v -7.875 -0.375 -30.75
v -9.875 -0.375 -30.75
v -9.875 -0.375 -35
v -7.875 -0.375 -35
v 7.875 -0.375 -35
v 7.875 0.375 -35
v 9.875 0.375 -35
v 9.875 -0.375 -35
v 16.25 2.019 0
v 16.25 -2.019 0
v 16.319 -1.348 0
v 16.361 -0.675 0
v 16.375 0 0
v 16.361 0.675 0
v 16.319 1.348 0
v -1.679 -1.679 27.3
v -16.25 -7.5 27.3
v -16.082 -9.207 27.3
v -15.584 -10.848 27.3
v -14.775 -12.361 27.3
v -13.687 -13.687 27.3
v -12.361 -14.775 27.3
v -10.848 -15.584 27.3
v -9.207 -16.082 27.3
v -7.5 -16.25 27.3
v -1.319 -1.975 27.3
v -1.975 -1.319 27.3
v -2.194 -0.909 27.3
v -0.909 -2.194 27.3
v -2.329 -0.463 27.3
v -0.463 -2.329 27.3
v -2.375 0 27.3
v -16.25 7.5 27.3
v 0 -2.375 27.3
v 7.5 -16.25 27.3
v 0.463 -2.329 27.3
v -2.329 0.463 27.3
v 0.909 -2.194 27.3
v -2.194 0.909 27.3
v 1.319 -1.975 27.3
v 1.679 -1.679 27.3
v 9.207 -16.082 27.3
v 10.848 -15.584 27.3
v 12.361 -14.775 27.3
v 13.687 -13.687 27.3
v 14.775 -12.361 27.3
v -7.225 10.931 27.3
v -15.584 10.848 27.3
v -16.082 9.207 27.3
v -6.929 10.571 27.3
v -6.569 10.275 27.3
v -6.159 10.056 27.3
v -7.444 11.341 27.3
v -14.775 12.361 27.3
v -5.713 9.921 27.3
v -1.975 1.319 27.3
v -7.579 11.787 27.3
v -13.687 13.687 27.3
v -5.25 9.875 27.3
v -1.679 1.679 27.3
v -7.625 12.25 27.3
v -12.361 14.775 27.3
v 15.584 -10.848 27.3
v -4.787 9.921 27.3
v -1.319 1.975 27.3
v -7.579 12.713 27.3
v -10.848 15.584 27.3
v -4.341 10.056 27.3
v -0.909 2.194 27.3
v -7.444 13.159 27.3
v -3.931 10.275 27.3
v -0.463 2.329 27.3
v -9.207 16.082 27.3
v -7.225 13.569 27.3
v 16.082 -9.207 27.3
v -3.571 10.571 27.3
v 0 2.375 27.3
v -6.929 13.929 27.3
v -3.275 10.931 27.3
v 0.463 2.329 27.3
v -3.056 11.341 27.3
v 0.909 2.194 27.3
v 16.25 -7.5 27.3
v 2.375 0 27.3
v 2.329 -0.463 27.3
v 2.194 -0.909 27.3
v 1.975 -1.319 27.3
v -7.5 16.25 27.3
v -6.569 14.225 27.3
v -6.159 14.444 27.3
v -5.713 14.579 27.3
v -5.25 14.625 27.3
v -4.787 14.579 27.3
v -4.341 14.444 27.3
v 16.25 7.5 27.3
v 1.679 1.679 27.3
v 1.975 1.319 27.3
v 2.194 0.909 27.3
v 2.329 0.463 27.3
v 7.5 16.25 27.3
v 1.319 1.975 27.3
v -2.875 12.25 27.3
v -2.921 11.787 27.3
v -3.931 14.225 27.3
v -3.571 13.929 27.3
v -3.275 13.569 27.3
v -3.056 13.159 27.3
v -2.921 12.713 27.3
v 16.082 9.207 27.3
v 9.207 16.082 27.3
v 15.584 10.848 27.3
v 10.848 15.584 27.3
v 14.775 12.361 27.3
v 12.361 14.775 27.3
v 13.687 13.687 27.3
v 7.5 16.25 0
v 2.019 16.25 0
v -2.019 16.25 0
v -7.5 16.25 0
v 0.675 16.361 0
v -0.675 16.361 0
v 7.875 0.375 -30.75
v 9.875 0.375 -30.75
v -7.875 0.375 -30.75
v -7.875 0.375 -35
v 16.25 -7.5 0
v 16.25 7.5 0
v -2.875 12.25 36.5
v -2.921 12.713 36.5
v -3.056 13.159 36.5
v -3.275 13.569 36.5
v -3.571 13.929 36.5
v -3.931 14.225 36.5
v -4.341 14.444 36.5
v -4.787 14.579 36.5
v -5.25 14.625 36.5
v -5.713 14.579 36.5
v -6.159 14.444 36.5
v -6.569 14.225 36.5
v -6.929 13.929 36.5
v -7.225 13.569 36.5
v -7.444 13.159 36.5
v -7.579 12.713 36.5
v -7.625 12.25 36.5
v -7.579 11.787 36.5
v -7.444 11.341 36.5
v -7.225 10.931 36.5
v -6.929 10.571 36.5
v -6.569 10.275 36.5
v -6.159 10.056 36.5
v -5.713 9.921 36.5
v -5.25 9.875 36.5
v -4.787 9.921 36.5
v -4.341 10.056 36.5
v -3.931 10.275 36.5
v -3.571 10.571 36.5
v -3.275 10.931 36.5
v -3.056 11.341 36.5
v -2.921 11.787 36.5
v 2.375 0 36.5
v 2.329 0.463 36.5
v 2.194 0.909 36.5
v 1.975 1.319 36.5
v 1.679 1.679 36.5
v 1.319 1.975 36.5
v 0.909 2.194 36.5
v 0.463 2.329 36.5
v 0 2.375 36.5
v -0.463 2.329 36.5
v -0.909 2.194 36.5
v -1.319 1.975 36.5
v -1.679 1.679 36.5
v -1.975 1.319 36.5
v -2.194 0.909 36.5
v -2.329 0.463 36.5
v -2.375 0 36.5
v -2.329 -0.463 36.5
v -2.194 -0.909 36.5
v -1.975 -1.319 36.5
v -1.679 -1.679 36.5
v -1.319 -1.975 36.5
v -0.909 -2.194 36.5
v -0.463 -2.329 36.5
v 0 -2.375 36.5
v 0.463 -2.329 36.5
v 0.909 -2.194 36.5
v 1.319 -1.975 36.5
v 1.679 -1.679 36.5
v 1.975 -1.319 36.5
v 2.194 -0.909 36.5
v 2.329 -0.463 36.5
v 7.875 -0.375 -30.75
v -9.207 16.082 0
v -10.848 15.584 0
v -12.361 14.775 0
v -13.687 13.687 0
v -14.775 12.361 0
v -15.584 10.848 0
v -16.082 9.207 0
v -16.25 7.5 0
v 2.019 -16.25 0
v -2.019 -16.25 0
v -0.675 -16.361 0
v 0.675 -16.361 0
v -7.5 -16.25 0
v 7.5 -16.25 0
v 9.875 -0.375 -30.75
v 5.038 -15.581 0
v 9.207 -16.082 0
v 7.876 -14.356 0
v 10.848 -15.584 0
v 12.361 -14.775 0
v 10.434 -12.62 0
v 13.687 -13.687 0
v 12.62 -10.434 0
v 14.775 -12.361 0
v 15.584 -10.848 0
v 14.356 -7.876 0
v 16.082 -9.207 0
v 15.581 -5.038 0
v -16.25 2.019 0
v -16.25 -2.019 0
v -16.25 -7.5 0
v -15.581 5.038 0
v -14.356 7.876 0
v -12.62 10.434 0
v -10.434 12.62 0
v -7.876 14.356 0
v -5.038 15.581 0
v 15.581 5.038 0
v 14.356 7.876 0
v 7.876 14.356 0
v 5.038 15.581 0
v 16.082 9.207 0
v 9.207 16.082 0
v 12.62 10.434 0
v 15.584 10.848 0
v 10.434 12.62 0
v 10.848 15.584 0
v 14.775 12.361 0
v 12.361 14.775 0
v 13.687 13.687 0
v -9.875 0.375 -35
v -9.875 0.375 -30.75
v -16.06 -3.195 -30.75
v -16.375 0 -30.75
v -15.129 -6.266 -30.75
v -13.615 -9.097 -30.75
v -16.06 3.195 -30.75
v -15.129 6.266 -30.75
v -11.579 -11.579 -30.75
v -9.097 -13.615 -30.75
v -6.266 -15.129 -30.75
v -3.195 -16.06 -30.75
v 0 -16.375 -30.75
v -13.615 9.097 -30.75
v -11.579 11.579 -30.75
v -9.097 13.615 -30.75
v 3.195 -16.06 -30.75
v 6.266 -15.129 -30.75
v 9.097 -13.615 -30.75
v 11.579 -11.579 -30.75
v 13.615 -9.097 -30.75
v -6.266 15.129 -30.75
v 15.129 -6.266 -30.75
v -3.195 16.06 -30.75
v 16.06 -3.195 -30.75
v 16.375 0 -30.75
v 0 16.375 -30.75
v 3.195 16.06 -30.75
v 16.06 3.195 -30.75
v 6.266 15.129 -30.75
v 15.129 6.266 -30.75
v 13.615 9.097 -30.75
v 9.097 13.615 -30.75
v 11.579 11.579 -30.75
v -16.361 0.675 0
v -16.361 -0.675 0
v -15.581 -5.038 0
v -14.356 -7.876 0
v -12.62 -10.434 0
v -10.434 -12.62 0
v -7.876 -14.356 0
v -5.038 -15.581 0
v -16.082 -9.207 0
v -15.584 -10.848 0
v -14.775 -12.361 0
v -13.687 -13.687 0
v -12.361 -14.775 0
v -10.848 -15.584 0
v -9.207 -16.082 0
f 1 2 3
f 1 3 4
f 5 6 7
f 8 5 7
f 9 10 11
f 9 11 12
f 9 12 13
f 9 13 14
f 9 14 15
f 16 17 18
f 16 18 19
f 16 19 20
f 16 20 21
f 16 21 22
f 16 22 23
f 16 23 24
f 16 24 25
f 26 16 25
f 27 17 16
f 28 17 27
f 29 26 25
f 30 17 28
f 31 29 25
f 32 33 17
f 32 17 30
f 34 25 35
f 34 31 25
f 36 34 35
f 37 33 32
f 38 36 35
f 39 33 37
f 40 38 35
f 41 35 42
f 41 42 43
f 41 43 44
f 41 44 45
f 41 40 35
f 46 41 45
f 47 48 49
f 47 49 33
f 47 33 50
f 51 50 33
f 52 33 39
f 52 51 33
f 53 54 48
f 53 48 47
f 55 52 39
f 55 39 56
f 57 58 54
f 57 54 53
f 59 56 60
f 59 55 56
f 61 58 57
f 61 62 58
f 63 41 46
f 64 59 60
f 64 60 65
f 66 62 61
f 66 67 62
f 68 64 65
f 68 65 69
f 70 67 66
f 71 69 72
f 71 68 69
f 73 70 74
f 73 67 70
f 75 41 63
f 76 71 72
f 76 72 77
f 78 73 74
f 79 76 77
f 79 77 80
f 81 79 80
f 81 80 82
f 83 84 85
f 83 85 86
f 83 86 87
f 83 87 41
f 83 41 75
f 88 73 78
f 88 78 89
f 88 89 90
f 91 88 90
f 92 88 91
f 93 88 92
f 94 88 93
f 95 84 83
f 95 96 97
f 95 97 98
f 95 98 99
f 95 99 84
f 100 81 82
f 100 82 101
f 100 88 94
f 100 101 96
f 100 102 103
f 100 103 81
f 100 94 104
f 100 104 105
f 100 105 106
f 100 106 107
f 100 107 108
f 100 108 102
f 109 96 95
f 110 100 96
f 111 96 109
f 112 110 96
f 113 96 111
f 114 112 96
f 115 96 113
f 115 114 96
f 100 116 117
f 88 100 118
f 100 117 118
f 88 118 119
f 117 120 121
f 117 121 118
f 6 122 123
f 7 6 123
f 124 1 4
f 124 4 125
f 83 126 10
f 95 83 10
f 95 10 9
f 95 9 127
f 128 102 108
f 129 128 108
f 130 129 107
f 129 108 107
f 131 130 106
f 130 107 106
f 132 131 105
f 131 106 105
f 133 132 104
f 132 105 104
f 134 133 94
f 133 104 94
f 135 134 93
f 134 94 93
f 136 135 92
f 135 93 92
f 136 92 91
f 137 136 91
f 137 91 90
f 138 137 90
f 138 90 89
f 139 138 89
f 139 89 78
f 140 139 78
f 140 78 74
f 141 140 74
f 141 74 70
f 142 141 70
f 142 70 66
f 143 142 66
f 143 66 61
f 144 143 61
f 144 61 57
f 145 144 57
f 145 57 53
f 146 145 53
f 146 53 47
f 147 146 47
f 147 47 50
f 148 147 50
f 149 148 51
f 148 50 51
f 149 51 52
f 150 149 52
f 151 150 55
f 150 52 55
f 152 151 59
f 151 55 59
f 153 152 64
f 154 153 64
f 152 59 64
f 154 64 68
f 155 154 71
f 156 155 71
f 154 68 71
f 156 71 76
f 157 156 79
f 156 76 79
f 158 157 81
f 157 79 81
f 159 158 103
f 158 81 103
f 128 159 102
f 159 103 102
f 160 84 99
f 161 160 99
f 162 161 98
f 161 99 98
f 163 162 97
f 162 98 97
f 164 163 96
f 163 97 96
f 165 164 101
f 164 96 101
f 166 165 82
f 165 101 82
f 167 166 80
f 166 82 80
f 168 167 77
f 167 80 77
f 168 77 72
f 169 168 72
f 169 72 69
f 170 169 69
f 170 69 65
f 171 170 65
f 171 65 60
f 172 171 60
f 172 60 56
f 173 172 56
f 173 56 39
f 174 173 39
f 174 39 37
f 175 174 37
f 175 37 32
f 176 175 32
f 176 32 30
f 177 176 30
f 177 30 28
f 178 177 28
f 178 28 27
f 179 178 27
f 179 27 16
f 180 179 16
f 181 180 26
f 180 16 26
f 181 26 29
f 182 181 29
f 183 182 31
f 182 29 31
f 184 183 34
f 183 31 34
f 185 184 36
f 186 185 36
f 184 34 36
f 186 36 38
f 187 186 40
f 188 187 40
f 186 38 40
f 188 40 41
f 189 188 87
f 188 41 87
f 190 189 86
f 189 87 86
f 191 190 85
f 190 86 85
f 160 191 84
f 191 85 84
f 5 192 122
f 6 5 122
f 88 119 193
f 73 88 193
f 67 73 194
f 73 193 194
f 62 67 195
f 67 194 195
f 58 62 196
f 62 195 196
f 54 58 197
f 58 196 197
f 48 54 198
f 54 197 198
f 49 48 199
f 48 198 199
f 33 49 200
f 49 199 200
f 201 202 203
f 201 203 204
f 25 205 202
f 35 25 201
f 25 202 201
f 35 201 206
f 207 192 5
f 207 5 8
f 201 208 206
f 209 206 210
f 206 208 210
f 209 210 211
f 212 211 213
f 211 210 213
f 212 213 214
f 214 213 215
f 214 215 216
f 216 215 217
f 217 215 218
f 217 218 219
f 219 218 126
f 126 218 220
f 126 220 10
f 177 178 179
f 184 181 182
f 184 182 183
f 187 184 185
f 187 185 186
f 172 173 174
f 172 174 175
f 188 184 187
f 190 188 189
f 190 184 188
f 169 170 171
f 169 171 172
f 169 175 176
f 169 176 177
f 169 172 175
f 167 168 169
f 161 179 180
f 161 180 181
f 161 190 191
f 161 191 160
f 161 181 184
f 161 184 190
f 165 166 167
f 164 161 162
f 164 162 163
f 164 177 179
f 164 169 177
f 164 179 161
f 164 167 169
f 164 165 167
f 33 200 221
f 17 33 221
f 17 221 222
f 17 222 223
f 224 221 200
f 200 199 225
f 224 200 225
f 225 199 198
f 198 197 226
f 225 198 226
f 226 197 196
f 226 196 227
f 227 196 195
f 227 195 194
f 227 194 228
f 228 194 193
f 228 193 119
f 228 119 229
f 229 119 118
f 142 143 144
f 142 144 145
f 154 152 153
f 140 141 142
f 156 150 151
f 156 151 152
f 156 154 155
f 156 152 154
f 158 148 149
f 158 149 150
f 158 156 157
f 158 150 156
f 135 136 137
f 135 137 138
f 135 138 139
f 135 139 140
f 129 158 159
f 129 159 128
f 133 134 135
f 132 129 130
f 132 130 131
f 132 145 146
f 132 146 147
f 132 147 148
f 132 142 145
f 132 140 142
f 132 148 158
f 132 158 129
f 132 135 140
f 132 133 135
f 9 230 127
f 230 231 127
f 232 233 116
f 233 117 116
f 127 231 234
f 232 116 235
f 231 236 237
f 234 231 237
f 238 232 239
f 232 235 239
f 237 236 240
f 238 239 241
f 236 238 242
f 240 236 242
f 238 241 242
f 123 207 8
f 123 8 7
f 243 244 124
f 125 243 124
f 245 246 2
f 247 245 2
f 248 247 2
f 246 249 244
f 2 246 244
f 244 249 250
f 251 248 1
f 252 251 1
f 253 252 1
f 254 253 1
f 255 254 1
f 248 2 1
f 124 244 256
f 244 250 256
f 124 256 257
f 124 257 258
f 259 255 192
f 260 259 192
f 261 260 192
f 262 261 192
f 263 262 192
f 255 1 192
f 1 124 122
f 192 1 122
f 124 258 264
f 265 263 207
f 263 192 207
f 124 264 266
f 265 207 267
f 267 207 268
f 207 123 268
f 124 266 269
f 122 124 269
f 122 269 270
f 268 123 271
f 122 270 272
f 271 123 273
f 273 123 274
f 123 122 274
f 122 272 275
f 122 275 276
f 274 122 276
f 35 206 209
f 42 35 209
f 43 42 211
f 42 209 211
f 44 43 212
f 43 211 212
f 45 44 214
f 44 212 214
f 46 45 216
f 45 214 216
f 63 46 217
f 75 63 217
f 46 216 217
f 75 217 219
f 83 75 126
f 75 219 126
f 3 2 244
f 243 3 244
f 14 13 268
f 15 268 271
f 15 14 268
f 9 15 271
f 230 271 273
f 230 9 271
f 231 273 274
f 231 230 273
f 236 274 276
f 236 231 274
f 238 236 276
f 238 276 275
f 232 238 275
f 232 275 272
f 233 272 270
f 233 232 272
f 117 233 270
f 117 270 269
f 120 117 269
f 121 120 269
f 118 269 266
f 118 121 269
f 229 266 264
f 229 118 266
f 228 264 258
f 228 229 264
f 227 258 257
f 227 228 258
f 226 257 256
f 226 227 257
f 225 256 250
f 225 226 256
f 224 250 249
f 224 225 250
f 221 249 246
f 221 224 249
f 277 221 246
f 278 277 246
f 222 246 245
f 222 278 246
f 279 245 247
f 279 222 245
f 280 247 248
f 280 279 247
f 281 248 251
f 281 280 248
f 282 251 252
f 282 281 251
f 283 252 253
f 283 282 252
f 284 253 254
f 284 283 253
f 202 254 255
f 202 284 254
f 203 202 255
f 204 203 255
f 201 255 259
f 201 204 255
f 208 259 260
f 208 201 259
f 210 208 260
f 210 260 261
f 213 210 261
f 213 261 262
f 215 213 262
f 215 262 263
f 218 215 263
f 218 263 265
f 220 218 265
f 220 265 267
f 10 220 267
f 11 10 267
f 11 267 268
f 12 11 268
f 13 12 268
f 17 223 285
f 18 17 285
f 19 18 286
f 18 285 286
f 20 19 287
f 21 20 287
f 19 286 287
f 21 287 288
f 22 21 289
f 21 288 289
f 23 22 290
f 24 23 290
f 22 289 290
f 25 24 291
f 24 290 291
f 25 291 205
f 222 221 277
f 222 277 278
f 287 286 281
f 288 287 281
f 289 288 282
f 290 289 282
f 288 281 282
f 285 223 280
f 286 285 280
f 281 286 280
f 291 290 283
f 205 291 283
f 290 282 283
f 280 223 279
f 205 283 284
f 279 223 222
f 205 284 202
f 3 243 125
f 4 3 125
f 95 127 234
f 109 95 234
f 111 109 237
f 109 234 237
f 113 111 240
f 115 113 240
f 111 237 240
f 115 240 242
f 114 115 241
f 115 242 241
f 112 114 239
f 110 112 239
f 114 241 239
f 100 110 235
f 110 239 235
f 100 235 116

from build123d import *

# Parameters (mm, degrees)
PAD_DEPTH    = 27.3
SKETCH001_R  = 16.375
PAD001_DEPTH = 30.75
SKETCH002_R  = 2.375
PAD002_DEPTH = 36.5
SKETCH004_W  = 2
SKETCH004_H  = 0.75
PAD004_DEPTH = 35


with BuildPart() as part:
    # Sketch → Pad (new body)
    with BuildSketch(Plane.XY):
        with BuildLine():
            Line((-16.25, 7.500021), (-16.25, -7.5))
            ThreePointArc((-16.25, -7.5), (-13.687184, -13.687185), (-7.499999, -16.25))
            Line((-7.499999, -16.25), (7.500022, -16.25))
            ThreePointArc((7.500022, -16.25), (13.687191, -13.687191), (16.25, -7.500023))
            Line((16.25, -7.500023), (16.25, 7.499999))
            ThreePointArc((16.25, 7.499999), (13.687185, 13.687184), (7.5, 16.25))
            Line((7.5, 16.25), (-7.500021, 16.25))
            ThreePointArc((-7.500021, 16.25), (-13.687184, 13.687184), (-16.25, 7.500021))
        make_face()
    extrude(amount=PAD_DEPTH)

    # Sketch001 → Pad001 (join)
    with BuildSketch(Plane.XY):
        Circle(SKETCH001_R)
    extrude(amount=-PAD001_DEPTH)

    # Sketch002 → Pad002 (join)
    with BuildSketch(Plane.XY):
        Circle(SKETCH002_R)
        with Locations((-5.25, 12.25)):
            Circle(SKETCH002_R)
    extrude(amount=PAD002_DEPTH)

    # Sketch004 → Pad004 (join)
    with BuildSketch(Plane.XY):
        with Locations((-8.875, 0)):
            Rectangle(SKETCH004_W, SKETCH004_H)
        with Locations((8.875, 0)):
            Rectangle(SKETCH004_W, SKETCH004_H)
    extrude(amount=-PAD004_DEPTH)


solid = part.part
